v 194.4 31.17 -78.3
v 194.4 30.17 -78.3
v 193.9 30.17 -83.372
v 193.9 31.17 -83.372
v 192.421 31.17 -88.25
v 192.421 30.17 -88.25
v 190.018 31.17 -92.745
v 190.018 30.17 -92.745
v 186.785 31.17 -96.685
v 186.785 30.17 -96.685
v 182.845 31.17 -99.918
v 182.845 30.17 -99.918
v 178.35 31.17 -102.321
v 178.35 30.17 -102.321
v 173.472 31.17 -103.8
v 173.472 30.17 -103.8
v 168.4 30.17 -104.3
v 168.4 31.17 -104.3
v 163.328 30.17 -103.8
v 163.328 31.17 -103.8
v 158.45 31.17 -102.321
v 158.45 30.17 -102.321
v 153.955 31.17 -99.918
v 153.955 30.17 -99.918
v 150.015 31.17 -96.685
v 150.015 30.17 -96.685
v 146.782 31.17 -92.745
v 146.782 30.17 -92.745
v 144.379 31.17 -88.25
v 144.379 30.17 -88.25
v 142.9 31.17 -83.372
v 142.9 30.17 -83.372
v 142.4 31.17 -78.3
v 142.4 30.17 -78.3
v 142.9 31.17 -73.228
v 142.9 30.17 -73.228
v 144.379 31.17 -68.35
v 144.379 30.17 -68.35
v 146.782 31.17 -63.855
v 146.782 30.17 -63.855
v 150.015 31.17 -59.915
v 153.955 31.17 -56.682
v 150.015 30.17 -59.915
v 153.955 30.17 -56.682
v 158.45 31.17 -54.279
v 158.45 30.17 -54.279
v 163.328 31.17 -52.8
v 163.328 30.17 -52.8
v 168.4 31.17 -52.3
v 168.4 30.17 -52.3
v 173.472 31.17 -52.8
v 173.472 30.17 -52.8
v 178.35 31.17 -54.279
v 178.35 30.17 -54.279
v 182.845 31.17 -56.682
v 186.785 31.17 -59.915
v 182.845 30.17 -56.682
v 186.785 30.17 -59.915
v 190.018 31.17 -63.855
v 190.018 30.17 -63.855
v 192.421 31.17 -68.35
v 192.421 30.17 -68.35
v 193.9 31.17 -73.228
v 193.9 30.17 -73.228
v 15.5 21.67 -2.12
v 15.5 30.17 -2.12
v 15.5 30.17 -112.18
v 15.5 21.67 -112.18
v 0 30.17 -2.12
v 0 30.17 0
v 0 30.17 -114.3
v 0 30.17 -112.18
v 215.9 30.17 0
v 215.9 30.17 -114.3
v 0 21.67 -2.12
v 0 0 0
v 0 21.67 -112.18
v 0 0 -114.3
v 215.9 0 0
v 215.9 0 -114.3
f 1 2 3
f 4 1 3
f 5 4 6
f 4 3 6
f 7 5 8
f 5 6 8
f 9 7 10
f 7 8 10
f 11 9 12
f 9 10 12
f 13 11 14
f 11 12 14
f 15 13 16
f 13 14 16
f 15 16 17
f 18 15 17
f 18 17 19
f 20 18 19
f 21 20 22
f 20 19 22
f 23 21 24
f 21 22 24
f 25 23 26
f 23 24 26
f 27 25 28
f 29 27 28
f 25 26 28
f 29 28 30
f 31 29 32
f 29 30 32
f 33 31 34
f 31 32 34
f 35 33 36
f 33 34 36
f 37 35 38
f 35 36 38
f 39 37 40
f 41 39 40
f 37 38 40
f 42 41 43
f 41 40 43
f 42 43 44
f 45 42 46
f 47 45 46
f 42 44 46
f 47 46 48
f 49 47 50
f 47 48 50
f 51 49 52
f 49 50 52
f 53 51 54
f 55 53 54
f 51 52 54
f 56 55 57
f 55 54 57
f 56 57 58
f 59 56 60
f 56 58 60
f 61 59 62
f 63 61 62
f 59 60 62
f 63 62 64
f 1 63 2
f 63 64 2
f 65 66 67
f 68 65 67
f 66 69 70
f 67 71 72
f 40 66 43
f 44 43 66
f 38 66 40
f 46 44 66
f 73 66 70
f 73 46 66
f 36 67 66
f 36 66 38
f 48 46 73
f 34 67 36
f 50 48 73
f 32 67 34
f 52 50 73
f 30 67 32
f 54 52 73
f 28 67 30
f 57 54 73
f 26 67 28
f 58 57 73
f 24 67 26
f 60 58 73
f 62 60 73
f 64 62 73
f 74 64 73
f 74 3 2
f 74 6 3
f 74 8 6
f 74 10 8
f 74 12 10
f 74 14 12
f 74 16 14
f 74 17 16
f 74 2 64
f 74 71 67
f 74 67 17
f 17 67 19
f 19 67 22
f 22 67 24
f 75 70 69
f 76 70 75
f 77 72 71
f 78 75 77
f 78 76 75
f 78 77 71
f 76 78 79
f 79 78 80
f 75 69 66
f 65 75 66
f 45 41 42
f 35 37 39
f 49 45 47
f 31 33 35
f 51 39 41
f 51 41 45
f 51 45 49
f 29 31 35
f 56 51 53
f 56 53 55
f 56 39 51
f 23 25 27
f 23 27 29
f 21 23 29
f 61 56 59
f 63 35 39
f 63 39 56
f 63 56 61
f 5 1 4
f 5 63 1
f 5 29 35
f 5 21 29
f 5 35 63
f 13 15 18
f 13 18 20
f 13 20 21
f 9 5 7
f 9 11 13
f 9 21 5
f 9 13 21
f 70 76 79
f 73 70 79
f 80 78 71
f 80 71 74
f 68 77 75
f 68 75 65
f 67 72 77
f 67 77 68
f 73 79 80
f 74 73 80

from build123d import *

# Parameters (mm, degrees)
SKETCH1_W           = 215.9
SKETCH1_H           = 114.3
BOSS_EXTRUDE1_DEPTH = 30.17
SKETCH2_W           = 15.5
SKETCH2_H           = 110.06
CUT_EXTRUDE1_DEPTH  = 8.5
SKETCH3_R           = 26
BOSS_EXTRUDE2_DEPTH = 1


with BuildPart() as part:
    # Sketch1 → Boss-Extrude1 (new body)
    with BuildSketch(Plane(origin=(0, 0, 0), x_dir=(1, 0, 0), z_dir=(0, 1, 0))):
        with Locations((107.95, 57.15)):
            Rectangle(SKETCH1_W, SKETCH1_H)
    extrude(amount=BOSS_EXTRUDE1_DEPTH)

    # Sketch2 → Cut-Extrude1 (cut)
    with BuildSketch(Plane(origin=(0, 30.17, 0), x_dir=(1, 0, 0), z_dir=(0, 1, 0))):
        with Locations((7.75, 57.15)):
            Rectangle(SKETCH2_W, SKETCH2_H)
    extrude(amount=-CUT_EXTRUDE1_DEPTH, mode=Mode.SUBTRACT)

    # Sketch3 → Boss-Extrude2 (add)
    with BuildSketch(Plane(origin=(0, 30.17, 0), x_dir=(1, 0, 0), z_dir=(0, 1, 0))):
        with Locations((168.4, 78.3)):
            Circle(SKETCH3_R)
    extrude(amount=BOSS_EXTRUDE2_DEPTH)


solid = part.part
